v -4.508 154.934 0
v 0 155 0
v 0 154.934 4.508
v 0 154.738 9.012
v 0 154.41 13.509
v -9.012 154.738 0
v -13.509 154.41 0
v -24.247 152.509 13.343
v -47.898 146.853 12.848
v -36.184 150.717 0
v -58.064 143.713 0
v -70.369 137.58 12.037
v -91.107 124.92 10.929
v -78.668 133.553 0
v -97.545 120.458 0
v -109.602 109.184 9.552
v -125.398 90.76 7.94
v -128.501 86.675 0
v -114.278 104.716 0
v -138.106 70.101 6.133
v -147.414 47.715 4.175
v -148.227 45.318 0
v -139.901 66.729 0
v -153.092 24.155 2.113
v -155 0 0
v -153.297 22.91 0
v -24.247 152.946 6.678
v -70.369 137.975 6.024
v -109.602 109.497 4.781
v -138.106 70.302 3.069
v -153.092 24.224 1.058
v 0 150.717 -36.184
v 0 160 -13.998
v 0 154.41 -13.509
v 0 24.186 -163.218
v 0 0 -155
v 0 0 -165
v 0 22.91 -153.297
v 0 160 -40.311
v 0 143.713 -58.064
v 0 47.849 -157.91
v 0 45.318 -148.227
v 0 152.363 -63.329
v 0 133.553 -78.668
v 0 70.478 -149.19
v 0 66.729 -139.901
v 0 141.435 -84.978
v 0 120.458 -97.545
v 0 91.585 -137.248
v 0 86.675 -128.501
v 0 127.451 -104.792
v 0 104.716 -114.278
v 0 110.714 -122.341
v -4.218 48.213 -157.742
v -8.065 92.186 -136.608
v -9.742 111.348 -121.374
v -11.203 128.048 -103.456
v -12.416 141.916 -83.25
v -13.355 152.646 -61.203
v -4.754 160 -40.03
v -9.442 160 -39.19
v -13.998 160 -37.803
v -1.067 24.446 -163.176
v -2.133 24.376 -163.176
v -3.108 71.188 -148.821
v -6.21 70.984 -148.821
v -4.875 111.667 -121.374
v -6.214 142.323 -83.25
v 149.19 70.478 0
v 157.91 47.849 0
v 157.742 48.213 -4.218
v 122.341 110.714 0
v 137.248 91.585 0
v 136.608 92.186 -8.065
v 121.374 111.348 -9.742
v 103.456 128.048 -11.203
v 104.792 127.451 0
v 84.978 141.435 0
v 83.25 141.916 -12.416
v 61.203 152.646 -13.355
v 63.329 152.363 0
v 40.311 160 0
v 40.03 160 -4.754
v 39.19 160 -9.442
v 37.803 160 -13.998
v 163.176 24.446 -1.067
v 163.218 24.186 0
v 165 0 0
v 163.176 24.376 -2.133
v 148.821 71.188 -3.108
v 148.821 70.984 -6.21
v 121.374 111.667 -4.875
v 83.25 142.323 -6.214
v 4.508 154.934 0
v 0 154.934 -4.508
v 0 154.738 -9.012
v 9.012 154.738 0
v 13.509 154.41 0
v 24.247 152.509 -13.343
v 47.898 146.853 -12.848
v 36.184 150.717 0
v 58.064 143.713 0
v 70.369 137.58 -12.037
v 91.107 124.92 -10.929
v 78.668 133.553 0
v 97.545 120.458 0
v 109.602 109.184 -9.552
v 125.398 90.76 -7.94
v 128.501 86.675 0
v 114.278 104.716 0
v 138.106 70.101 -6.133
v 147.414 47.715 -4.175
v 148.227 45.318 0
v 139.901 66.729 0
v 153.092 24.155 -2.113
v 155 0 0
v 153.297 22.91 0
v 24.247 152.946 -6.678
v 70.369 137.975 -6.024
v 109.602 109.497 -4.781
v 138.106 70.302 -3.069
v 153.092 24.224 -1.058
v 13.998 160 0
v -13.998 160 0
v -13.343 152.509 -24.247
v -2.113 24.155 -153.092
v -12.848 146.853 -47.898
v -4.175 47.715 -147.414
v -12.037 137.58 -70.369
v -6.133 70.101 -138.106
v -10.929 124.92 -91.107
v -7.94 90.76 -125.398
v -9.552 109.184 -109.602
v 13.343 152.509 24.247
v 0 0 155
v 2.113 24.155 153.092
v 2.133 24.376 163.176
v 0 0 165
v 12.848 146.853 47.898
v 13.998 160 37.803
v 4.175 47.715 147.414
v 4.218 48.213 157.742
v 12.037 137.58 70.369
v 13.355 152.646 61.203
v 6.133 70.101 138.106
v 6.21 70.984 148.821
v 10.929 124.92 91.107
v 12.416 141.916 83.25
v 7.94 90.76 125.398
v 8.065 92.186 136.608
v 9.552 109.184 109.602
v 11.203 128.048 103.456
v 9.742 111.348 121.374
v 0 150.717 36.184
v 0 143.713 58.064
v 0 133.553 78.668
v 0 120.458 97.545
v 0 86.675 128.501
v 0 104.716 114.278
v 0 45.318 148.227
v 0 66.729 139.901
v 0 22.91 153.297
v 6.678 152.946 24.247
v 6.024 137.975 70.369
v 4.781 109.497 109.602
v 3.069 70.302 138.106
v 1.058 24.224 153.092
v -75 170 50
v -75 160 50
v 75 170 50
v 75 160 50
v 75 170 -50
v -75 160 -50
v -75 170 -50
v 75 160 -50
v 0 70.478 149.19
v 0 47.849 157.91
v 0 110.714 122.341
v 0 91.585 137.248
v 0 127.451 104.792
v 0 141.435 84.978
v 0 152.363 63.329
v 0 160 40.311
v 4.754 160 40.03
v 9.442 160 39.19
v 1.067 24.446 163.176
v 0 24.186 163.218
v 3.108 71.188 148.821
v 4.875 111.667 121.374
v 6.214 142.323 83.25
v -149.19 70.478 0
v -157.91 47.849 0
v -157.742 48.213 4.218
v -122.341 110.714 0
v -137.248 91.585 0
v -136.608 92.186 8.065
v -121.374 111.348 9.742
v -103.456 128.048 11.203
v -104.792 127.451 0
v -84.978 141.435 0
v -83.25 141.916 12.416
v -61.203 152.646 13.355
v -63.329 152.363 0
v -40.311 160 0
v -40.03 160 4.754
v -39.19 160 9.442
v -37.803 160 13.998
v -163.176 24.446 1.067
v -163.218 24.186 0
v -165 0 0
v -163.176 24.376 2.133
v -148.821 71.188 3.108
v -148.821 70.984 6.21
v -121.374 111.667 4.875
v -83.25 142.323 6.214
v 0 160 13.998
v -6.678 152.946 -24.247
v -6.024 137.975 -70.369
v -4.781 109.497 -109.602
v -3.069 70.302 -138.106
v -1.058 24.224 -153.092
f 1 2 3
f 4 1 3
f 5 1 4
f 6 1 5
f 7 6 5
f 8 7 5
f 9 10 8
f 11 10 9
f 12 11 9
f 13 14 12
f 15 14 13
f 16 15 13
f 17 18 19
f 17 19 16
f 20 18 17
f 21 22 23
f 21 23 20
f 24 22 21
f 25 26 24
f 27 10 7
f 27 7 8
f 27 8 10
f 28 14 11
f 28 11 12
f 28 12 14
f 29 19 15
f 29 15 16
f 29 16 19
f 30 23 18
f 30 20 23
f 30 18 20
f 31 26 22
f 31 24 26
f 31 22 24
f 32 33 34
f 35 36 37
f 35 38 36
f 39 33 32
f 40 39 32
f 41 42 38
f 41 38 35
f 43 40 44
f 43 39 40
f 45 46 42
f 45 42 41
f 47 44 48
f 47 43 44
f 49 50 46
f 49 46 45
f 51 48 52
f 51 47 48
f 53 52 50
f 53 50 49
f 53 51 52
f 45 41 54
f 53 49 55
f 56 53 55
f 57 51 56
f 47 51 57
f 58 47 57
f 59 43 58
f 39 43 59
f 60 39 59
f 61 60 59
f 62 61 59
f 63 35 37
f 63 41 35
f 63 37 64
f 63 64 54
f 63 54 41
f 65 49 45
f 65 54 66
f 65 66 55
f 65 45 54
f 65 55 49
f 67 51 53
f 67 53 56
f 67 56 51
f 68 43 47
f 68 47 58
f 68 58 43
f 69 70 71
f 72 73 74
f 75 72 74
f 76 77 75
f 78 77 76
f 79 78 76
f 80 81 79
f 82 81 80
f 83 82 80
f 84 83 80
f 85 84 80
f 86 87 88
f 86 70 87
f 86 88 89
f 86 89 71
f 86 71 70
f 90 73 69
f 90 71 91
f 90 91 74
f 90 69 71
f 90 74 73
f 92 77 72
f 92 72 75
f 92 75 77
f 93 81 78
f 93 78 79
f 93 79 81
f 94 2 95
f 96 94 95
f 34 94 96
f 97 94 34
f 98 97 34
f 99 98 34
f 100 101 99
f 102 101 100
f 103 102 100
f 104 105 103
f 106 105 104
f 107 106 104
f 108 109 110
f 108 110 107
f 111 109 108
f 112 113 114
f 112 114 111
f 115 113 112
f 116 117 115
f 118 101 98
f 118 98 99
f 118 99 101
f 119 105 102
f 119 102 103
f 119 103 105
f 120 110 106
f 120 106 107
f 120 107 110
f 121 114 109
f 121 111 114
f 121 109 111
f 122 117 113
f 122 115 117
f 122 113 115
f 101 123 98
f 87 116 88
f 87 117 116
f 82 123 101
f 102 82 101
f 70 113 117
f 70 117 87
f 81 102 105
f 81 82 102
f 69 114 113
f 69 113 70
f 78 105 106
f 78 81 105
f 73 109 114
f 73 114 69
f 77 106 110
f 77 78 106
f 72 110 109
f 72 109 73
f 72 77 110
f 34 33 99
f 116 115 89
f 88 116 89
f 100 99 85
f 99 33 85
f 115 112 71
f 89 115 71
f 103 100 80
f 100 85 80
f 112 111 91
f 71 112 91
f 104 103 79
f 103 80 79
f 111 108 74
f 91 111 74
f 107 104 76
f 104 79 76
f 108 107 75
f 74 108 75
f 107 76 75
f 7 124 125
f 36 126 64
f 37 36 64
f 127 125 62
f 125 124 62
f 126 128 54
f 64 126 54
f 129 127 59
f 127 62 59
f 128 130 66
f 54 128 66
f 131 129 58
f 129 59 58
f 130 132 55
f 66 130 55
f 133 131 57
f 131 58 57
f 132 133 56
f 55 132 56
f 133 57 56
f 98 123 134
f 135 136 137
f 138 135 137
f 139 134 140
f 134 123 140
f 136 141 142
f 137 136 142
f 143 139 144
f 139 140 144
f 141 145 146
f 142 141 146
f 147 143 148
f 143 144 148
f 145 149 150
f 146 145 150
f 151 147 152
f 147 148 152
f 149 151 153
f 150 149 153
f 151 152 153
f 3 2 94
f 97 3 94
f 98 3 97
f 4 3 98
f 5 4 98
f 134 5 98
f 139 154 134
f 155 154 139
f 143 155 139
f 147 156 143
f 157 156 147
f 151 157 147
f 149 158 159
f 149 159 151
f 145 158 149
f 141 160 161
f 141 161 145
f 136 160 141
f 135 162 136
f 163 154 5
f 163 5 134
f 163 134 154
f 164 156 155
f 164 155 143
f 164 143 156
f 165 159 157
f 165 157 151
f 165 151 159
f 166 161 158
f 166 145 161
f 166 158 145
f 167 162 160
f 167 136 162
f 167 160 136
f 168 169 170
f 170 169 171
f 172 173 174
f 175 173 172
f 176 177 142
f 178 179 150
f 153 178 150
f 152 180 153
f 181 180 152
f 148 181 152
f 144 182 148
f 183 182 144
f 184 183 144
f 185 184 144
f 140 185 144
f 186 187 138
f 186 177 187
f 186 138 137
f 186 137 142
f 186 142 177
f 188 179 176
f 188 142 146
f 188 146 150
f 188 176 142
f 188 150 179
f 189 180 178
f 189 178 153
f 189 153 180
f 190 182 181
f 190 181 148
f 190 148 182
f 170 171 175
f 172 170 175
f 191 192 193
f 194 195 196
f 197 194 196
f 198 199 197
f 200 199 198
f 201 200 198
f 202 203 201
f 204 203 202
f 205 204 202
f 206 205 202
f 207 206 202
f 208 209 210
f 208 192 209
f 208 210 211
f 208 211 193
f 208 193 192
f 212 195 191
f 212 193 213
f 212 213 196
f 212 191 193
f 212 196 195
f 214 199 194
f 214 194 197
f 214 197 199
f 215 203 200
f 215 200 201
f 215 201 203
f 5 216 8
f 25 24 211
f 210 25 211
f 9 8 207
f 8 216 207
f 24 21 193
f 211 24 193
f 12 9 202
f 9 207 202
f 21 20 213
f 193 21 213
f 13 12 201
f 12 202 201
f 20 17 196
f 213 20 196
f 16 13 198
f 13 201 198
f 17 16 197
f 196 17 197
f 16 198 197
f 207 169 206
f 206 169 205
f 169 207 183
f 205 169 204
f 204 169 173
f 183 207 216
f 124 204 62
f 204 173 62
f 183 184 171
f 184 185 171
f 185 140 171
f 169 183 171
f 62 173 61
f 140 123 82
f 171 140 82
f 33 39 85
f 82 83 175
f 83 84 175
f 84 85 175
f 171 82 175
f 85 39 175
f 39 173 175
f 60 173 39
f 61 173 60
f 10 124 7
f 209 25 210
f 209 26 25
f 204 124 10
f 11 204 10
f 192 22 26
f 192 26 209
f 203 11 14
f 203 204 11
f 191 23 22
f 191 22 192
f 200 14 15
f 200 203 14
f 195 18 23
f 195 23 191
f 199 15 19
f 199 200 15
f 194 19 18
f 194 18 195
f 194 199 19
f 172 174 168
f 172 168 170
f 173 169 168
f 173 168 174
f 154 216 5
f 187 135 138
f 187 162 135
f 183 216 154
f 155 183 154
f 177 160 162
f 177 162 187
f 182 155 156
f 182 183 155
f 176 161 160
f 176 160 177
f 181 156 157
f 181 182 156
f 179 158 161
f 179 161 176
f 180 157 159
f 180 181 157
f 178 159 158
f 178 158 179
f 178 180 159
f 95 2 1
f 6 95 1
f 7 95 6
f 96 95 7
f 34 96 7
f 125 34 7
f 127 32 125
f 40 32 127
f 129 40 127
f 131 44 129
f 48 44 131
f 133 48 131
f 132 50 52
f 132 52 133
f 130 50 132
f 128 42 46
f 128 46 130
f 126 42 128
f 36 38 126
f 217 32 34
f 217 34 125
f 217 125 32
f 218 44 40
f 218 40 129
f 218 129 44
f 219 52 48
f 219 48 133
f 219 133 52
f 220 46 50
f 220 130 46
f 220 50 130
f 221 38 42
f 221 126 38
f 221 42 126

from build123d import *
from build123d.topology import SkipClean

# Parameters (mm, degrees)
REVOLVE1_ANGLE      = 5
CIRPATTERN1_COUNT   = 4
BOSS_EXTRUDE2_START = 160
SKETCH4_W           = 150
SKETCH4_H           = 100
BOSS_EXTRUDE2_DEPTH = 10


with BuildPart() as part:
    # Sketch1 → Revolve1 (revolve)
    with BuildSketch(Plane.XY):
        with BuildLine():
            Line((0, 165), (0, 155))
            ThreePointArc((0, 155), (-109.601551084, 109.601551084), (-155, 0))
            Line((-155, 0), (-165, 0))
            ThreePointArc((-165, 0), (-116.672618896, 116.672618896), (0, 165))
        make_face()
    revolve(axis=Axis((-165, 0, 0), (1, 0, 0)), revolution_arc=REVOLVE1_ANGLE)


with BuildPart() as cirpattern1_1:
    # CirPattern1: pattern copy
    add(part.part.rotate(Axis((0, 0, 0), (0, 1, 0)), 1 * 360 / CIRPATTERN1_COUNT))


with BuildPart() as cirpattern1_2:
    # CirPattern1: pattern copy
    add(part.part.rotate(Axis((0, 0, 0), (0, 1, 0)), 2 * 360 / CIRPATTERN1_COUNT))


with BuildPart() as cirpattern1_3:
    # CirPattern1: pattern copy
    add(part.part.rotate(Axis((0, 0, 0), (0, 1, 0)), 3 * 360 / CIRPATTERN1_COUNT))


with BuildPart() as part_1:
    with SkipClean():  # the faces are left unmerged after this step: merging them gives an invalid solid
        add(part.part)

        add(cirpattern1_1.part)  # Boss-Extrude2 merges CirPattern1_1

        add(cirpattern1_2.part)  # Boss-Extrude2 merges CirPattern1_2

        add(cirpattern1_3.part)  # Boss-Extrude2 merges CirPattern1_3
        # Sketch4 → Boss-Extrude2 (add)
        with BuildSketch(Plane(origin=(0, 0, 0), x_dir=(1, 0, 0), z_dir=(0, 1, 0)).offset(BOSS_EXTRUDE2_START)):
            Rectangle(SKETCH4_W, SKETCH4_H)
        extrude(amount=BOSS_EXTRUDE2_DEPTH)


solid = part_1.part
